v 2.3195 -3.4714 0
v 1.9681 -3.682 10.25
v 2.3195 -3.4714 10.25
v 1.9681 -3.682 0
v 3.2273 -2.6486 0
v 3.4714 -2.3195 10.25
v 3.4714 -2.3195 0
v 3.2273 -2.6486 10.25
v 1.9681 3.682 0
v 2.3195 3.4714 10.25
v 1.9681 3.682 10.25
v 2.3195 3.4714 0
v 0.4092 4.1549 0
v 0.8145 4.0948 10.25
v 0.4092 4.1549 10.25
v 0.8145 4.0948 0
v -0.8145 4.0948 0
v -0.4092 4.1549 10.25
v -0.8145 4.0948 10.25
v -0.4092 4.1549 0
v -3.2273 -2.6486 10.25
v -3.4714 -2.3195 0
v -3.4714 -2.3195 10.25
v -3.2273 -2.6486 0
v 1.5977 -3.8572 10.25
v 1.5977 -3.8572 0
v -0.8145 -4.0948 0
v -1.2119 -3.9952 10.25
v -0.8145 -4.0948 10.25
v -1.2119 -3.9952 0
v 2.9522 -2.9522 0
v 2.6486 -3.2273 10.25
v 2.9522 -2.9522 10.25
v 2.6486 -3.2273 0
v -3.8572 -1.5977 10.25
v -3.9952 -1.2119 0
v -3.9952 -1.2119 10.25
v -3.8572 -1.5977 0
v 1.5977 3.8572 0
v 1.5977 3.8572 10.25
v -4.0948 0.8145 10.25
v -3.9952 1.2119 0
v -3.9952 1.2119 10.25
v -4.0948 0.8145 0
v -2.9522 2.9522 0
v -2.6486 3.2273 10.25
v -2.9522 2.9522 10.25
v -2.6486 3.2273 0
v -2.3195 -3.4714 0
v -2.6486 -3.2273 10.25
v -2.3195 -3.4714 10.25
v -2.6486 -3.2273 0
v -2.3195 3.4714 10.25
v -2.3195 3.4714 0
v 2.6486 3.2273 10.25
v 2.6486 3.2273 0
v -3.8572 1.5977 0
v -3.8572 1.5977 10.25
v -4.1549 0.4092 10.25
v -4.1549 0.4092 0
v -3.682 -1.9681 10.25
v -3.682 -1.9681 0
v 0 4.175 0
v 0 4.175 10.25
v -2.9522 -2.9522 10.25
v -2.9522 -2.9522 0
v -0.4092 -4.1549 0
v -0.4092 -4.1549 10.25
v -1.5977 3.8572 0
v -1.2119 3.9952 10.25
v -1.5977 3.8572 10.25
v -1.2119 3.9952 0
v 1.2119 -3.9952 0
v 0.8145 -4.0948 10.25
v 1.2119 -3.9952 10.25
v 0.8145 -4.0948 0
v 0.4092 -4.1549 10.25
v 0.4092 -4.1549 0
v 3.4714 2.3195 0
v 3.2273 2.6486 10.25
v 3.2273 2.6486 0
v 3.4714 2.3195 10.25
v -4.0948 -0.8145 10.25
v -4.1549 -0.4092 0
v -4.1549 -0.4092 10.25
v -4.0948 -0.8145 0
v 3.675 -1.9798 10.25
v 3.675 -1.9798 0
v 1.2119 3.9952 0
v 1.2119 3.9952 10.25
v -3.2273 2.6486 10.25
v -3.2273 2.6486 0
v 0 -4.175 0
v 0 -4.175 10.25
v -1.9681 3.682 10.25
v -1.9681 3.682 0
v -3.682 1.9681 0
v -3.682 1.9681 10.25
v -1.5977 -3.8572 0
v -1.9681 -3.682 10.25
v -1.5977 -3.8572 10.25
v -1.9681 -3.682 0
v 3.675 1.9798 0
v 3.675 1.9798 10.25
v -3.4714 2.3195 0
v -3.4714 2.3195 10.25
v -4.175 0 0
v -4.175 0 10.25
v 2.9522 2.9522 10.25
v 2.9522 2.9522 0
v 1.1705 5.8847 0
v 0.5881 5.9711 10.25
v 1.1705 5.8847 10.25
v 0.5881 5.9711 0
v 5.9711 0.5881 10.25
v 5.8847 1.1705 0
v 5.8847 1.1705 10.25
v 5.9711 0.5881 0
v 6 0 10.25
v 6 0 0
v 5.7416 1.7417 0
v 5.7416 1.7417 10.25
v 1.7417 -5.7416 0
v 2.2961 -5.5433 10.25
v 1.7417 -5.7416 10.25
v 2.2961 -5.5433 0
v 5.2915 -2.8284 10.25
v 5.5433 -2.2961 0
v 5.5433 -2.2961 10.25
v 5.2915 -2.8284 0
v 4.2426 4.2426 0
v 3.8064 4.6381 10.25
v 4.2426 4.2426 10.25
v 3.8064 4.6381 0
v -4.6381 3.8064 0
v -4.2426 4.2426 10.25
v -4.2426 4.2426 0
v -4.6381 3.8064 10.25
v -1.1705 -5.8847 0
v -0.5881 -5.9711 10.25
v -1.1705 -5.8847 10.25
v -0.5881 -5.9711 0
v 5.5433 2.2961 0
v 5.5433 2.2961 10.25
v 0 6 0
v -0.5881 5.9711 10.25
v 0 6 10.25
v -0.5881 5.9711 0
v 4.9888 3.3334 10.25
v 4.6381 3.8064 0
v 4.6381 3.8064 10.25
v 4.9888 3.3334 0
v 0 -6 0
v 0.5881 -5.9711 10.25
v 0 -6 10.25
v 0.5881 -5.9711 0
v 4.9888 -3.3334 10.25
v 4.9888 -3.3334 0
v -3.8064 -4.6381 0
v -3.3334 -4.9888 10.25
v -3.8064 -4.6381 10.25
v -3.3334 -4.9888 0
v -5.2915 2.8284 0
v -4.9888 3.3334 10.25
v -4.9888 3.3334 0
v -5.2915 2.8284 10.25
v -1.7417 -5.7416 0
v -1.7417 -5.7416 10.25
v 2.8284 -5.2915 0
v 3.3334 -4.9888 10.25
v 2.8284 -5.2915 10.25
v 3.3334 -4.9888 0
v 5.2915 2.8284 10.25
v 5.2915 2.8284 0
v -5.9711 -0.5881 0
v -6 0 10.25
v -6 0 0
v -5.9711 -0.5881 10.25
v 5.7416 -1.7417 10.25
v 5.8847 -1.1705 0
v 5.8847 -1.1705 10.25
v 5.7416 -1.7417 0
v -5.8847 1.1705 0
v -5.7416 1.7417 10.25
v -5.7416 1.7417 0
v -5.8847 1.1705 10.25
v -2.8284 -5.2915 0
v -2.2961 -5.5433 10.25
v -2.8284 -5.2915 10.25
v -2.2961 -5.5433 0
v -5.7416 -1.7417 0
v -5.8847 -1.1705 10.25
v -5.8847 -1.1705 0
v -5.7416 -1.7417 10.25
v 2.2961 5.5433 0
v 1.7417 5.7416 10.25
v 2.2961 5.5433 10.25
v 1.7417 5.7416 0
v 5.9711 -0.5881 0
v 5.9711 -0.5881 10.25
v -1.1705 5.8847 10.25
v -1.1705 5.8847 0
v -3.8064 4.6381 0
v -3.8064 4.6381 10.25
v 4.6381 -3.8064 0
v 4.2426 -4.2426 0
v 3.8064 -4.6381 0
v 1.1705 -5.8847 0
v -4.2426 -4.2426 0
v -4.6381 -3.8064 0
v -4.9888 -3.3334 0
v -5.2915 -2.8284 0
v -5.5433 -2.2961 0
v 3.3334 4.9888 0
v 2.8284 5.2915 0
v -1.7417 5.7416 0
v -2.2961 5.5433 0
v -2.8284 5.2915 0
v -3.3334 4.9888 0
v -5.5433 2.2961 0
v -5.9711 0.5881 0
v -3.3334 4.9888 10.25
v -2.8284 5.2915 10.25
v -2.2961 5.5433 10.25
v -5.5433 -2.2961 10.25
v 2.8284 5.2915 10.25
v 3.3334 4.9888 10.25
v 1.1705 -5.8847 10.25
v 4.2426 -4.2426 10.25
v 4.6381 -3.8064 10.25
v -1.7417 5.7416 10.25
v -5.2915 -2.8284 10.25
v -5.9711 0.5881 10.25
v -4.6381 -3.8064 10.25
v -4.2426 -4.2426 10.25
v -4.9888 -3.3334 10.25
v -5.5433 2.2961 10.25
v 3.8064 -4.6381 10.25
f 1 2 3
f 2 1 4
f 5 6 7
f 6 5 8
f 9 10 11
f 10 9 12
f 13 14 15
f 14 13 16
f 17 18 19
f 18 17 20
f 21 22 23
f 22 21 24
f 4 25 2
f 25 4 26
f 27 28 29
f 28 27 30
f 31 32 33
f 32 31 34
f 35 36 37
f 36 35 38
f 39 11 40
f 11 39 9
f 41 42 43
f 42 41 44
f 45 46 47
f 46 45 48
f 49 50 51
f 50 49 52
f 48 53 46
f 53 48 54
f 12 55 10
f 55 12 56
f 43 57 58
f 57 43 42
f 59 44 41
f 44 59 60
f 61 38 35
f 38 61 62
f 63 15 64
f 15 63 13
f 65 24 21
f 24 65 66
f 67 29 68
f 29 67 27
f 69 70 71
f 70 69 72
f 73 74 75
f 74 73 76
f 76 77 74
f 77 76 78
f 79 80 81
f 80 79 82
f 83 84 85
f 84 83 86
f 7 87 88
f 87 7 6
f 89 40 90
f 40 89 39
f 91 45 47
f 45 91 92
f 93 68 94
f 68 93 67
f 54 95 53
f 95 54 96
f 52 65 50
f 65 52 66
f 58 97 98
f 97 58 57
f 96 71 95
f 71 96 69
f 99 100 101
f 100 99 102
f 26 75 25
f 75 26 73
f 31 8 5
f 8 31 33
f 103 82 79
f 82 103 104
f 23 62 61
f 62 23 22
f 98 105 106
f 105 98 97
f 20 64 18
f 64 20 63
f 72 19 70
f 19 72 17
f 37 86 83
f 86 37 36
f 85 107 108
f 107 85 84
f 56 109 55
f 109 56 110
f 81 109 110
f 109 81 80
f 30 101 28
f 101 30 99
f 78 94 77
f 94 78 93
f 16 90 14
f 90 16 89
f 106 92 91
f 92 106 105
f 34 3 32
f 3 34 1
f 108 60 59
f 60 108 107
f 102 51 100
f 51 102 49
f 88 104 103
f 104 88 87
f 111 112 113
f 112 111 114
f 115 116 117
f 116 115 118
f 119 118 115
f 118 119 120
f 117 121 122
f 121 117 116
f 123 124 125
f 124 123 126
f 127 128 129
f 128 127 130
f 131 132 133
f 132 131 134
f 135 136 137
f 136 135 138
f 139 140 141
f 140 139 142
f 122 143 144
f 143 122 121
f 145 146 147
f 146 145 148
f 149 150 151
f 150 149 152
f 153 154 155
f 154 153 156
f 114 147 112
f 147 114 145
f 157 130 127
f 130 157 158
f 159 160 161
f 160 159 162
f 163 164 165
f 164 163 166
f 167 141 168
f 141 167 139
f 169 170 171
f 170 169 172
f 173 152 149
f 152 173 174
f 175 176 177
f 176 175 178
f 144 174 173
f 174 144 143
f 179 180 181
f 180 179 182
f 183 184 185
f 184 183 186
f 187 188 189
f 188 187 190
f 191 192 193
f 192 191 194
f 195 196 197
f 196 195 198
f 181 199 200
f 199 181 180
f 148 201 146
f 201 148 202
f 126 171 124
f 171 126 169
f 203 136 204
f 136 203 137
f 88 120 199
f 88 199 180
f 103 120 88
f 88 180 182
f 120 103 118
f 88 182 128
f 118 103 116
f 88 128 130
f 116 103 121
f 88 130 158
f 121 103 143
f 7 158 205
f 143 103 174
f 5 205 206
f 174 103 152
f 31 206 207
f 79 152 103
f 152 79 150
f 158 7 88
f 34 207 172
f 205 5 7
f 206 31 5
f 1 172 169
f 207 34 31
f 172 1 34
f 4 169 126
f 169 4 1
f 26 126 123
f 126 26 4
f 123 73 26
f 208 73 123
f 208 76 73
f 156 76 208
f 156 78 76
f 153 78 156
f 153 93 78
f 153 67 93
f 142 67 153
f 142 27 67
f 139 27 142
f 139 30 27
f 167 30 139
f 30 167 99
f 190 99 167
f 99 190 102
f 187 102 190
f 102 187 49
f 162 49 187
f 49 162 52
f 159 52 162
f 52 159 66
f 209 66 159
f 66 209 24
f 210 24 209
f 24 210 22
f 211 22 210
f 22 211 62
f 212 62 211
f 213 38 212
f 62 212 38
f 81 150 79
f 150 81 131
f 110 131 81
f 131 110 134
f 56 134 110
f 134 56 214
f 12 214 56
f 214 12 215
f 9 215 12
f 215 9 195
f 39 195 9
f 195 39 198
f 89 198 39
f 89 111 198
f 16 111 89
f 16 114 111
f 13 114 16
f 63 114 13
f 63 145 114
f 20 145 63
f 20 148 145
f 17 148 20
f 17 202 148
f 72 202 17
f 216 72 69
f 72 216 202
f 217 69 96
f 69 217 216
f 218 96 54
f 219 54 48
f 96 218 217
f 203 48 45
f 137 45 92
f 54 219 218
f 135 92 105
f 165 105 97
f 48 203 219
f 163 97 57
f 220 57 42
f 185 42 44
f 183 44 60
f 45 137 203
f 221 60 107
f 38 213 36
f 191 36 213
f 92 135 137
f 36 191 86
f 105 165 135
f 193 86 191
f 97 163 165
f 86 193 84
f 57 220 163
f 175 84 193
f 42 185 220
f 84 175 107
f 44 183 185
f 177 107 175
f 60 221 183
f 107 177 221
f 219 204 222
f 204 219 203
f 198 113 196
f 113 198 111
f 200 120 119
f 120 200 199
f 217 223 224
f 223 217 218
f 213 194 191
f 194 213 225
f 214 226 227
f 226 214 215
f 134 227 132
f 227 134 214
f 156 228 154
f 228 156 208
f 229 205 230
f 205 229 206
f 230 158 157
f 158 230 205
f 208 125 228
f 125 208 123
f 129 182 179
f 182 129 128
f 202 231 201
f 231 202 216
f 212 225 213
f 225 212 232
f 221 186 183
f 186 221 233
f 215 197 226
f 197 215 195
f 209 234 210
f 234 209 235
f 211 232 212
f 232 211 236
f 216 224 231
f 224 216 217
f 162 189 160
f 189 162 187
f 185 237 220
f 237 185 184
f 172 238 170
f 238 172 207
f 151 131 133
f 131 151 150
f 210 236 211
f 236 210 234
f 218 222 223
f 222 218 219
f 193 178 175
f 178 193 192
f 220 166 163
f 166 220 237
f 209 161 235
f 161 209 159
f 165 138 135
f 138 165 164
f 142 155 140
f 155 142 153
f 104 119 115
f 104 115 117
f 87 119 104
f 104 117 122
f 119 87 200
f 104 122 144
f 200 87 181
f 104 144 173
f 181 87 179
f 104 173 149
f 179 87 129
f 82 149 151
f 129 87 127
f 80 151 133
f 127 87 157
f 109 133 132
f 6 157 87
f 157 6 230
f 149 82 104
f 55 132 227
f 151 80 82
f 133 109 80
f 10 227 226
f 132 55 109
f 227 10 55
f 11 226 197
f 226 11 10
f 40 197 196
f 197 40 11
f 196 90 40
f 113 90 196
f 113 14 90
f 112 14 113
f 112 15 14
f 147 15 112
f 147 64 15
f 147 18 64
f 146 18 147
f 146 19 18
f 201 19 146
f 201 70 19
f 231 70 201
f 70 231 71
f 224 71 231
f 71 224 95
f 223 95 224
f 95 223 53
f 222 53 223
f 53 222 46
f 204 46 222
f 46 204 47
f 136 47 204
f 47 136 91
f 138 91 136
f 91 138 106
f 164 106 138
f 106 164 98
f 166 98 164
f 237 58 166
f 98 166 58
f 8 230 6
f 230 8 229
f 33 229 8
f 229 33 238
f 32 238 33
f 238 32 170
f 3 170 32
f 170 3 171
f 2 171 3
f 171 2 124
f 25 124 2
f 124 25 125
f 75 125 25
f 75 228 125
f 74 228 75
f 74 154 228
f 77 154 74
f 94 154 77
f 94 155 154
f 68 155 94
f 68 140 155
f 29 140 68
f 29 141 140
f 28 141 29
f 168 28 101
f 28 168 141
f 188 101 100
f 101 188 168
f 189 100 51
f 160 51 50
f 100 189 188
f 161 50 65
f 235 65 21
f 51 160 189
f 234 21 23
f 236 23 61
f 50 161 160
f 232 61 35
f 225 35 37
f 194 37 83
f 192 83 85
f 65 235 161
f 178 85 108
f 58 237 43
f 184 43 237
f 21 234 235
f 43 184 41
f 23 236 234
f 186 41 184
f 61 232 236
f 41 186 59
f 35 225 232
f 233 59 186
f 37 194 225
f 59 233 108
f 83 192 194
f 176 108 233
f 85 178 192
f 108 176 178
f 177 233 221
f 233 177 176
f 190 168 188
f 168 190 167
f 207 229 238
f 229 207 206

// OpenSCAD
// file: parameters.scad
// =============================================================================
// Gen-BM — nightly 2026-10-06 (physics_scorer, honest magpylib watts)
// Lowest-gap pancake: Ø20 ring at R52 (Ø5 assists R42/52/62) with low-profile 7.65 mm dense-wound copper and an 18 mm radial build on wide 29–71 mm sector bobbins — the smallest magnet gap of the series (10.25 mm) — on thick 1/4" (6.35 mm) steel so the higher flux per pole stays well clear of saturation.
// Clocking 0 deg (magnets N facing S) + D-flat keyed bore + index notch + flip-symmetric hole map.
// Windable 2-piece bobbin; turns = physics_scorer turns_fit; copper only between flanges.
// Steel back-iron: 2× Ø138 × 6.35 mm (1/4") mild-steel discs (steel_backiron_disc.dxf); magnets sit ON the steel
// (through-pockets) -> score with --back-iron.
// =============================================================================
topology            = "dual_rotor";

// --- Wire / winding (physics_scorer winding-fit) -------------------------------
wire_awg            = 26;
wire_od             = 0.45;     // insulated OD mm (bare 0.405)
fill_realistic      = 0.65;     // insulated-wire area / window (DENSE layered wind with a jig; scorer cap 0.65)
turns               = 562;       // = physics_scorer turns_fit (do NOT raise)
coil_former_type    = "bobbin";
coil_core_inset     = 18.00;     // radial copper build: hub = copper boundary inset by this
wind_build_axial    = 0.0;      // nothing proud of the flanges
wind_build_radial   = 0.0;

// --- Bobbin (base + lid) ---------------------------------------------------------
coil_id_r           = 29.00;    // copper boundary sector
coil_od_r           = 71.00;
span_deg            = 52.68;    // = pitch - 2*asin((wall+0.85)/coil_id_r) -> >=1.2 mm stator web
former_web          = 7.65;     // copper height between flanges (TALL copper: steel keeps Bz up)
flange_t            = 0.80;     // >= 0.8 mm FDM wall rule (tall winds push on the flanges)
wall                = 1.00;     // flange lip beyond copper
former_bare_h       = former_web + 2 * flange_t;
coil_envelope_h     = former_bare_h + 2 * wind_build_axial;
tab_w               = 7.0;
tab_len             = 7.0;
tab_h               = former_bare_h / 2;
pin_d               = 1.9;      // 1.75 mm filament locating pin
coil_mount_r        = coil_od_r + 0.2 + 4.0;
lead_y              = 1.6;
lead_slot_w         = 0.9;
lead_groove_d       = 0.6;

// --- Gap -------------------------------------------------------------------------
run_clear           = 0.50;     // rotor face -> flange
gap_spacer_h        = run_clear + wind_build_axial;
m2m                 = coil_envelope_h + 2 * run_clear;   // rotor face to rotor face (= gap_sleeve length)

// --- Stator ----------------------------------------------------------------------
coil_stations       = 6;
bay_clear           = 0.25;
stator_thick        = former_bare_h;                        // bobbins flush both faces
stator_od           = 160.0;
shaft_clear_stator  = 14.0;     // stator is static; gap sleeve OD 12 spins inside

// --- Rotor(s) --------------------------------------------------------------------
magnet_Br           = 1.43;     // N52
magnet_d_large      = 20.0;
magnet_h_large      = 5.0;      // one O20x5 per pocket
magnet_h_small      = 5.0;      // one O5x5 per pocket
halbach_magnetisation = "diametric"; // O5x5 assist magnets MUST be DIAMETRICALLY magnetised (tangential)
rotor_b_same_axis   = true;     // same-index magnets share one axis: N faces S across the gap
large_pocket_d      = 20.3;
small_pocket_d      = 5.3;
pocket_h            = 5.10;     // THROUGH the carrier: magnet back face sits on the steel disc
large_n             = 8;
R_large             = 52.0;
R_small_inner       = 42.0;
R_small_mid         = 52.0;
R_small_outer       = 62.0;
small_r_list        = [R_small_inner, R_small_mid, R_small_outer];   // O5 pockets between poles
carrier_od          = 138.0;
carrier_thick       = pocket_h;
hub_h               = 13.5;     // > steel_t + insert: radial set-screw clears the steel
hub_od              = 24.0;     // slim hub so the M4 brace rods fit at R~18 inside the coil ring
hub_insert_d        = 4.0;      // M3 heat-set insert, radial, bears on the D-flat
rotor_b_offset_deg  = 0.0;      // CLOCKING: magnets directly opposite
shaft_key           = "dflat";
dflat_depth         = 0.5;      // 8 mm shaft with 0.5 mm flat (7.5 across flat)
index_notch_d       = 3.0;

// --- Steel back-iron (buyable laser-cut) -------------------------------------------
steel_t             = 6.35;      // mild steel thickness (image method ignores it; sized from steel_flux.py so the return path stays well below saturation)
steel_center_hole   = 26.0;     // slips over the rotor hub (OD 24)
steel_od            = carrier_od;   // steel disc OD = rotor carrier OD

// --- Modular MAX interface ----------------------------------------------------------
shaft_bore          = 8.35;
dflat_x             = 4.0 - dflat_depth + (shaft_bore - 8.0) / 2;
bearing_d           = 21.85;
bearing_h           = 7.2;
m3_clear            = 3.5;
bolt_r_inner        = 30.0;     // M3 steel-disc clamp bolts (inside the magnet ring)
bolt_n_inner        = 4;
bolt_inner_angles   = [0, 90, 180, 270];
bolt_r_outer        = 65.0;     // M3 steel-disc clamp bolts (outside the magnet ring)
bolt_outer_angles   = [45, 135, 225, 315];
flange_bolt_r       = 75.0;     // frame rods: OUTSIDE the rotor OD (rotors spin inside them)
flange_bolt_n       = 6;
flange_bolt_offset  = 30.00;    // between coil stations -> never cuts a lead groove/tab
brace_r             = 18.0;
brace_d             = 4.3;      // temporary M4 jack rods (assembly only)
brace_n             = 4;
brace_angles        = [45, 135, 225, 315];          // flip-symmetric

spacer_pad_od       = 14.0;
spacer_pad_id       = m3_clear;
endbell_od          = 160.0;
endbell_thick       = 8.0;
endbell_shaft_clear = 10.0;
collar_h            = 10.0;
standoff_od         = 9.0;
frame_standoff_h    = run_clear + carrier_thick + hub_h + collar_h + 2.0;
sleeve_od           = 12.0;
plate_max_mm        = 410;

$fn = 64;
// main file
// Gen-BM — gap sleeve: rigid spacer on the shaft BETWEEN the two rotor carriers (passes through the stator
// hole). Length = m2m, so it sets the magnet gap and carries the full magnet pull. Print x1, upright.
include <parameters.scad>;
$fn = 64;
// D-flat keyed bore: flat faces +X (angle 0 = magnet pocket 0 = index notch)
module dflat_bore(h) {
    intersection() {
        cylinder(d=shaft_bore, h=h);
        translate([-shaft_bore, -shaft_bore, 0]) cube([shaft_bore + dflat_x, 2*shaft_bore, h]);
    }
}

difference() {
    cylinder(d=sleeve_od, h=m2m);
    translate([0, 0, -0.1]) dflat_bore(m2m + 0.2);
}
